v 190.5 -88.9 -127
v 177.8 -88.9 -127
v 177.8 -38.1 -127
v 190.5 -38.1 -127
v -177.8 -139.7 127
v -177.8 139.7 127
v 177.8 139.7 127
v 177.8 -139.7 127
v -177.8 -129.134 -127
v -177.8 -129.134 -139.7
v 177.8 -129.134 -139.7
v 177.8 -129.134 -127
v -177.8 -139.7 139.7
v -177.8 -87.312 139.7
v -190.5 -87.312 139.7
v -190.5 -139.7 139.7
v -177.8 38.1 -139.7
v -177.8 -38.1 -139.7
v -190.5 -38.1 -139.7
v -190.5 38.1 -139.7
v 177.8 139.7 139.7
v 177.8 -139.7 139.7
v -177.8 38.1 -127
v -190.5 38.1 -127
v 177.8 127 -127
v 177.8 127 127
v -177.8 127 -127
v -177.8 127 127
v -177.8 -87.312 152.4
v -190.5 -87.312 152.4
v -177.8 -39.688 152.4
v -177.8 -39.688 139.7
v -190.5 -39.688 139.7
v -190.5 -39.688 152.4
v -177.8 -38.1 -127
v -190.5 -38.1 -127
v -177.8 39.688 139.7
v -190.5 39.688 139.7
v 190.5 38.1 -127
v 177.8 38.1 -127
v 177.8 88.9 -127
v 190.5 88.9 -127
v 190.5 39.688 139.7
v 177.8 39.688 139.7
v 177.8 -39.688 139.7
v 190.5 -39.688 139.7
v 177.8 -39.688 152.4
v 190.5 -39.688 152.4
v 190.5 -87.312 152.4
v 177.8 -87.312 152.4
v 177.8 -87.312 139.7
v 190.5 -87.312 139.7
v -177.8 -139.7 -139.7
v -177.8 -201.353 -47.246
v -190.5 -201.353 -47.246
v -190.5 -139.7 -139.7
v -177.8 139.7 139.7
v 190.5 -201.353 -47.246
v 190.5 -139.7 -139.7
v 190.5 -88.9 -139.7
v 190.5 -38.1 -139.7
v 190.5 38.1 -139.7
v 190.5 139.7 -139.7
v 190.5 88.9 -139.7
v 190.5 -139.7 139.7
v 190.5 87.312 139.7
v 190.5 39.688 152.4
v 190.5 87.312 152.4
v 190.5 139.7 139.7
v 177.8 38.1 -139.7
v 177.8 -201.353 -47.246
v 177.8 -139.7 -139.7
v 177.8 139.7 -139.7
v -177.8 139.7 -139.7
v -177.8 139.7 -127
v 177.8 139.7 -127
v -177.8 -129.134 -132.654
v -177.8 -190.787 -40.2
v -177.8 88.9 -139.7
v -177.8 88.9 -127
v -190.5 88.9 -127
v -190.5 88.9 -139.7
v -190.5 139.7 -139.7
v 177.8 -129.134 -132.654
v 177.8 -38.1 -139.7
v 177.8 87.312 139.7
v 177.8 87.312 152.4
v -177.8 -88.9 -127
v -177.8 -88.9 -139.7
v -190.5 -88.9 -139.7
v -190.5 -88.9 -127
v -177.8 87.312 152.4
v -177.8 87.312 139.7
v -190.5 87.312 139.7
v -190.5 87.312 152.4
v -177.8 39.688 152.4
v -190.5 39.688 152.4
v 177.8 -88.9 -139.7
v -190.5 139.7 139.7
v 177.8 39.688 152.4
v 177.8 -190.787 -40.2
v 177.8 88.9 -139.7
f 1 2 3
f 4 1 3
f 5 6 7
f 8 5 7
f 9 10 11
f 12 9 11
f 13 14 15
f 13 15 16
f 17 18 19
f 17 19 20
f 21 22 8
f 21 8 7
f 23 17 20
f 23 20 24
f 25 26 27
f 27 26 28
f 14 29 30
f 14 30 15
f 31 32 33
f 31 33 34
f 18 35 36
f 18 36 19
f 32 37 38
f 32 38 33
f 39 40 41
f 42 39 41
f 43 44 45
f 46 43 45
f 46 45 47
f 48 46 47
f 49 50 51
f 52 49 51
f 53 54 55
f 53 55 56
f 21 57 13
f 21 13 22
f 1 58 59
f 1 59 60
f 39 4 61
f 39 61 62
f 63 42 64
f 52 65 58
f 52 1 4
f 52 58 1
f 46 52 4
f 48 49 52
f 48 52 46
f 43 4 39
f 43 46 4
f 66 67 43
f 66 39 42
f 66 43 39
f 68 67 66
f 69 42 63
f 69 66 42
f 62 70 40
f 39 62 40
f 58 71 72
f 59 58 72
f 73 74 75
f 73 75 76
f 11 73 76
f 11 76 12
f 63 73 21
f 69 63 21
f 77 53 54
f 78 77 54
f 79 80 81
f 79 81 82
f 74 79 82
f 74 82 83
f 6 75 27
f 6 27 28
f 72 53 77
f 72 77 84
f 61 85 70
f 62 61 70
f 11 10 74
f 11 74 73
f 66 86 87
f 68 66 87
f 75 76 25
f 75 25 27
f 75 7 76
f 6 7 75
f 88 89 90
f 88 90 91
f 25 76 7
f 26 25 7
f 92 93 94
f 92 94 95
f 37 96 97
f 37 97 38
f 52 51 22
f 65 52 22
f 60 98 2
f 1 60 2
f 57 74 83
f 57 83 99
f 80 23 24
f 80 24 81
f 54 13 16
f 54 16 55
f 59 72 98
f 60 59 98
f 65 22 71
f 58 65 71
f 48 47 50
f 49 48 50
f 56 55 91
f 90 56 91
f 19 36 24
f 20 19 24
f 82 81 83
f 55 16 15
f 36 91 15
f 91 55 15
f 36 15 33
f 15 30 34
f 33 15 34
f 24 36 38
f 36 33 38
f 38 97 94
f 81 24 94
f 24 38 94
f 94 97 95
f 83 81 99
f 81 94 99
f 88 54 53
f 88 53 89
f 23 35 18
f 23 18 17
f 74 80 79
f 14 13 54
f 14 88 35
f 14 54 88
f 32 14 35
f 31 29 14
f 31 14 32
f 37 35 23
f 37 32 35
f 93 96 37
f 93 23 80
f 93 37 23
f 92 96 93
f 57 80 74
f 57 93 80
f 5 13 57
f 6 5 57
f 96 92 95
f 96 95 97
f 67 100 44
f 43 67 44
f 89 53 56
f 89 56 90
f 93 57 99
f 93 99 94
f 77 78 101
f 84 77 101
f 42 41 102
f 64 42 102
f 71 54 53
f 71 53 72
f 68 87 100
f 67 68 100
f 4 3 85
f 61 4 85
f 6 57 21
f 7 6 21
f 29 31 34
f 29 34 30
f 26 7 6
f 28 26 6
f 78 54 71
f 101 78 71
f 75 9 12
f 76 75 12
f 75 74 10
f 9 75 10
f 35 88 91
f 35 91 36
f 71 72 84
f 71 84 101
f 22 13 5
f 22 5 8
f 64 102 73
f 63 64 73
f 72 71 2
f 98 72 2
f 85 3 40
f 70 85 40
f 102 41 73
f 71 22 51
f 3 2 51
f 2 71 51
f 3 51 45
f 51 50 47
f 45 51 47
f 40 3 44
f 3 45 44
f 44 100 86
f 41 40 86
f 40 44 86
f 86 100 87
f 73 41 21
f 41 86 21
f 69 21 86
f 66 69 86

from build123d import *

# Parameters (mm, degrees)
F3_START  = 177.8
F3_DEPTH  = 12.7
F5_W      = 355.6
F5_H      = 279.4
F6_DEPTH  = 12.7
F7_W      = 355.6
F7_H      = 111.125
F8_DEPTH  = 12.7
F9_W      = 355.6
F9_H      = 268.8338474026
F10_DEPTH = 12.7
F11_W     = 355.6
F11_H     = 254
F12_DEPTH = 12.7


# Not quite as in the source:
# - a variable given as a bare number and used for a length is read in inches; the dataset says mm whatever the document's units were


with BuildPart() as f3:
    # F2 (on Right) → F3 (new body)
    with BuildSketch(Plane.YZ.offset(F3_START)):
        Polygon((139.7, -139.7), (139.7, 139.7), (87.3125, 139.7), (87.3125, 152.4), (39.6875, 152.4), (39.6875, 139.7), (0, 139.7), (-39.6875, 139.7), (-39.6875, 152.4), (-87.3125, 152.4), (-87.3125, 139.7), (-139.7, 139.7), (-201.3526883174, -47.2461647727), (-139.7, -139.7), (-88.9, -139.7), (-88.9, -127), (-38.1, -127), (-38.1, -139.7), (0, -139.7), (38.1, -139.7), (38.1, -127), (88.9, -127), (88.9, -139.7), align=None)
    extrude(amount=F3_DEPTH)


with BuildPart() as f4_1:
    # F4: instance of F3
    add(f3.part.mirror(Plane.YZ))


with BuildPart() as f6:
    # F5 (on face) → F6 (new body)
    with BuildSketch(Plane.XY.offset(139.7)):
        Rectangle(F5_W, F5_H)
    extrude(amount=-F6_DEPTH)


with BuildPart() as f8:
    # F7 (on face) → F8 (new body)
    with BuildSketch(Plane(origin=(0, -161.1828435034, -107.4845147117), x_dir=(1, 0, 0), z_dir=(0, -0.8319805195, -0.5548048443))):
        with Locations((0, 16.8410581705)):
            Rectangle(F7_W, F7_H)
    extrude(amount=-F8_DEPTH)


with BuildPart() as f10:
    # F9 (on face) → F10 (new body)
    with BuildSketch(Plane(origin=(0, 0, -139.7), x_dir=(1, 0, 0), z_dir=(0, 0, -1))):
        with Locations((0, -5.2830762987)):
            Rectangle(F9_W, F9_H)
    extrude(amount=-F10_DEPTH)


with BuildPart() as f12:
    # F11 (on face) → F12 (new body)
    with BuildSketch(Plane(origin=(0, 139.7, 0), x_dir=(-1, 0, 0), z_dir=(0, 1, 0))):
        Rectangle(F11_W, F11_H)
    extrude(amount=-F12_DEPTH)


solid = Compound([f3.part, f4_1.part, f6.part, f8.part, f10.part, f12.part])
